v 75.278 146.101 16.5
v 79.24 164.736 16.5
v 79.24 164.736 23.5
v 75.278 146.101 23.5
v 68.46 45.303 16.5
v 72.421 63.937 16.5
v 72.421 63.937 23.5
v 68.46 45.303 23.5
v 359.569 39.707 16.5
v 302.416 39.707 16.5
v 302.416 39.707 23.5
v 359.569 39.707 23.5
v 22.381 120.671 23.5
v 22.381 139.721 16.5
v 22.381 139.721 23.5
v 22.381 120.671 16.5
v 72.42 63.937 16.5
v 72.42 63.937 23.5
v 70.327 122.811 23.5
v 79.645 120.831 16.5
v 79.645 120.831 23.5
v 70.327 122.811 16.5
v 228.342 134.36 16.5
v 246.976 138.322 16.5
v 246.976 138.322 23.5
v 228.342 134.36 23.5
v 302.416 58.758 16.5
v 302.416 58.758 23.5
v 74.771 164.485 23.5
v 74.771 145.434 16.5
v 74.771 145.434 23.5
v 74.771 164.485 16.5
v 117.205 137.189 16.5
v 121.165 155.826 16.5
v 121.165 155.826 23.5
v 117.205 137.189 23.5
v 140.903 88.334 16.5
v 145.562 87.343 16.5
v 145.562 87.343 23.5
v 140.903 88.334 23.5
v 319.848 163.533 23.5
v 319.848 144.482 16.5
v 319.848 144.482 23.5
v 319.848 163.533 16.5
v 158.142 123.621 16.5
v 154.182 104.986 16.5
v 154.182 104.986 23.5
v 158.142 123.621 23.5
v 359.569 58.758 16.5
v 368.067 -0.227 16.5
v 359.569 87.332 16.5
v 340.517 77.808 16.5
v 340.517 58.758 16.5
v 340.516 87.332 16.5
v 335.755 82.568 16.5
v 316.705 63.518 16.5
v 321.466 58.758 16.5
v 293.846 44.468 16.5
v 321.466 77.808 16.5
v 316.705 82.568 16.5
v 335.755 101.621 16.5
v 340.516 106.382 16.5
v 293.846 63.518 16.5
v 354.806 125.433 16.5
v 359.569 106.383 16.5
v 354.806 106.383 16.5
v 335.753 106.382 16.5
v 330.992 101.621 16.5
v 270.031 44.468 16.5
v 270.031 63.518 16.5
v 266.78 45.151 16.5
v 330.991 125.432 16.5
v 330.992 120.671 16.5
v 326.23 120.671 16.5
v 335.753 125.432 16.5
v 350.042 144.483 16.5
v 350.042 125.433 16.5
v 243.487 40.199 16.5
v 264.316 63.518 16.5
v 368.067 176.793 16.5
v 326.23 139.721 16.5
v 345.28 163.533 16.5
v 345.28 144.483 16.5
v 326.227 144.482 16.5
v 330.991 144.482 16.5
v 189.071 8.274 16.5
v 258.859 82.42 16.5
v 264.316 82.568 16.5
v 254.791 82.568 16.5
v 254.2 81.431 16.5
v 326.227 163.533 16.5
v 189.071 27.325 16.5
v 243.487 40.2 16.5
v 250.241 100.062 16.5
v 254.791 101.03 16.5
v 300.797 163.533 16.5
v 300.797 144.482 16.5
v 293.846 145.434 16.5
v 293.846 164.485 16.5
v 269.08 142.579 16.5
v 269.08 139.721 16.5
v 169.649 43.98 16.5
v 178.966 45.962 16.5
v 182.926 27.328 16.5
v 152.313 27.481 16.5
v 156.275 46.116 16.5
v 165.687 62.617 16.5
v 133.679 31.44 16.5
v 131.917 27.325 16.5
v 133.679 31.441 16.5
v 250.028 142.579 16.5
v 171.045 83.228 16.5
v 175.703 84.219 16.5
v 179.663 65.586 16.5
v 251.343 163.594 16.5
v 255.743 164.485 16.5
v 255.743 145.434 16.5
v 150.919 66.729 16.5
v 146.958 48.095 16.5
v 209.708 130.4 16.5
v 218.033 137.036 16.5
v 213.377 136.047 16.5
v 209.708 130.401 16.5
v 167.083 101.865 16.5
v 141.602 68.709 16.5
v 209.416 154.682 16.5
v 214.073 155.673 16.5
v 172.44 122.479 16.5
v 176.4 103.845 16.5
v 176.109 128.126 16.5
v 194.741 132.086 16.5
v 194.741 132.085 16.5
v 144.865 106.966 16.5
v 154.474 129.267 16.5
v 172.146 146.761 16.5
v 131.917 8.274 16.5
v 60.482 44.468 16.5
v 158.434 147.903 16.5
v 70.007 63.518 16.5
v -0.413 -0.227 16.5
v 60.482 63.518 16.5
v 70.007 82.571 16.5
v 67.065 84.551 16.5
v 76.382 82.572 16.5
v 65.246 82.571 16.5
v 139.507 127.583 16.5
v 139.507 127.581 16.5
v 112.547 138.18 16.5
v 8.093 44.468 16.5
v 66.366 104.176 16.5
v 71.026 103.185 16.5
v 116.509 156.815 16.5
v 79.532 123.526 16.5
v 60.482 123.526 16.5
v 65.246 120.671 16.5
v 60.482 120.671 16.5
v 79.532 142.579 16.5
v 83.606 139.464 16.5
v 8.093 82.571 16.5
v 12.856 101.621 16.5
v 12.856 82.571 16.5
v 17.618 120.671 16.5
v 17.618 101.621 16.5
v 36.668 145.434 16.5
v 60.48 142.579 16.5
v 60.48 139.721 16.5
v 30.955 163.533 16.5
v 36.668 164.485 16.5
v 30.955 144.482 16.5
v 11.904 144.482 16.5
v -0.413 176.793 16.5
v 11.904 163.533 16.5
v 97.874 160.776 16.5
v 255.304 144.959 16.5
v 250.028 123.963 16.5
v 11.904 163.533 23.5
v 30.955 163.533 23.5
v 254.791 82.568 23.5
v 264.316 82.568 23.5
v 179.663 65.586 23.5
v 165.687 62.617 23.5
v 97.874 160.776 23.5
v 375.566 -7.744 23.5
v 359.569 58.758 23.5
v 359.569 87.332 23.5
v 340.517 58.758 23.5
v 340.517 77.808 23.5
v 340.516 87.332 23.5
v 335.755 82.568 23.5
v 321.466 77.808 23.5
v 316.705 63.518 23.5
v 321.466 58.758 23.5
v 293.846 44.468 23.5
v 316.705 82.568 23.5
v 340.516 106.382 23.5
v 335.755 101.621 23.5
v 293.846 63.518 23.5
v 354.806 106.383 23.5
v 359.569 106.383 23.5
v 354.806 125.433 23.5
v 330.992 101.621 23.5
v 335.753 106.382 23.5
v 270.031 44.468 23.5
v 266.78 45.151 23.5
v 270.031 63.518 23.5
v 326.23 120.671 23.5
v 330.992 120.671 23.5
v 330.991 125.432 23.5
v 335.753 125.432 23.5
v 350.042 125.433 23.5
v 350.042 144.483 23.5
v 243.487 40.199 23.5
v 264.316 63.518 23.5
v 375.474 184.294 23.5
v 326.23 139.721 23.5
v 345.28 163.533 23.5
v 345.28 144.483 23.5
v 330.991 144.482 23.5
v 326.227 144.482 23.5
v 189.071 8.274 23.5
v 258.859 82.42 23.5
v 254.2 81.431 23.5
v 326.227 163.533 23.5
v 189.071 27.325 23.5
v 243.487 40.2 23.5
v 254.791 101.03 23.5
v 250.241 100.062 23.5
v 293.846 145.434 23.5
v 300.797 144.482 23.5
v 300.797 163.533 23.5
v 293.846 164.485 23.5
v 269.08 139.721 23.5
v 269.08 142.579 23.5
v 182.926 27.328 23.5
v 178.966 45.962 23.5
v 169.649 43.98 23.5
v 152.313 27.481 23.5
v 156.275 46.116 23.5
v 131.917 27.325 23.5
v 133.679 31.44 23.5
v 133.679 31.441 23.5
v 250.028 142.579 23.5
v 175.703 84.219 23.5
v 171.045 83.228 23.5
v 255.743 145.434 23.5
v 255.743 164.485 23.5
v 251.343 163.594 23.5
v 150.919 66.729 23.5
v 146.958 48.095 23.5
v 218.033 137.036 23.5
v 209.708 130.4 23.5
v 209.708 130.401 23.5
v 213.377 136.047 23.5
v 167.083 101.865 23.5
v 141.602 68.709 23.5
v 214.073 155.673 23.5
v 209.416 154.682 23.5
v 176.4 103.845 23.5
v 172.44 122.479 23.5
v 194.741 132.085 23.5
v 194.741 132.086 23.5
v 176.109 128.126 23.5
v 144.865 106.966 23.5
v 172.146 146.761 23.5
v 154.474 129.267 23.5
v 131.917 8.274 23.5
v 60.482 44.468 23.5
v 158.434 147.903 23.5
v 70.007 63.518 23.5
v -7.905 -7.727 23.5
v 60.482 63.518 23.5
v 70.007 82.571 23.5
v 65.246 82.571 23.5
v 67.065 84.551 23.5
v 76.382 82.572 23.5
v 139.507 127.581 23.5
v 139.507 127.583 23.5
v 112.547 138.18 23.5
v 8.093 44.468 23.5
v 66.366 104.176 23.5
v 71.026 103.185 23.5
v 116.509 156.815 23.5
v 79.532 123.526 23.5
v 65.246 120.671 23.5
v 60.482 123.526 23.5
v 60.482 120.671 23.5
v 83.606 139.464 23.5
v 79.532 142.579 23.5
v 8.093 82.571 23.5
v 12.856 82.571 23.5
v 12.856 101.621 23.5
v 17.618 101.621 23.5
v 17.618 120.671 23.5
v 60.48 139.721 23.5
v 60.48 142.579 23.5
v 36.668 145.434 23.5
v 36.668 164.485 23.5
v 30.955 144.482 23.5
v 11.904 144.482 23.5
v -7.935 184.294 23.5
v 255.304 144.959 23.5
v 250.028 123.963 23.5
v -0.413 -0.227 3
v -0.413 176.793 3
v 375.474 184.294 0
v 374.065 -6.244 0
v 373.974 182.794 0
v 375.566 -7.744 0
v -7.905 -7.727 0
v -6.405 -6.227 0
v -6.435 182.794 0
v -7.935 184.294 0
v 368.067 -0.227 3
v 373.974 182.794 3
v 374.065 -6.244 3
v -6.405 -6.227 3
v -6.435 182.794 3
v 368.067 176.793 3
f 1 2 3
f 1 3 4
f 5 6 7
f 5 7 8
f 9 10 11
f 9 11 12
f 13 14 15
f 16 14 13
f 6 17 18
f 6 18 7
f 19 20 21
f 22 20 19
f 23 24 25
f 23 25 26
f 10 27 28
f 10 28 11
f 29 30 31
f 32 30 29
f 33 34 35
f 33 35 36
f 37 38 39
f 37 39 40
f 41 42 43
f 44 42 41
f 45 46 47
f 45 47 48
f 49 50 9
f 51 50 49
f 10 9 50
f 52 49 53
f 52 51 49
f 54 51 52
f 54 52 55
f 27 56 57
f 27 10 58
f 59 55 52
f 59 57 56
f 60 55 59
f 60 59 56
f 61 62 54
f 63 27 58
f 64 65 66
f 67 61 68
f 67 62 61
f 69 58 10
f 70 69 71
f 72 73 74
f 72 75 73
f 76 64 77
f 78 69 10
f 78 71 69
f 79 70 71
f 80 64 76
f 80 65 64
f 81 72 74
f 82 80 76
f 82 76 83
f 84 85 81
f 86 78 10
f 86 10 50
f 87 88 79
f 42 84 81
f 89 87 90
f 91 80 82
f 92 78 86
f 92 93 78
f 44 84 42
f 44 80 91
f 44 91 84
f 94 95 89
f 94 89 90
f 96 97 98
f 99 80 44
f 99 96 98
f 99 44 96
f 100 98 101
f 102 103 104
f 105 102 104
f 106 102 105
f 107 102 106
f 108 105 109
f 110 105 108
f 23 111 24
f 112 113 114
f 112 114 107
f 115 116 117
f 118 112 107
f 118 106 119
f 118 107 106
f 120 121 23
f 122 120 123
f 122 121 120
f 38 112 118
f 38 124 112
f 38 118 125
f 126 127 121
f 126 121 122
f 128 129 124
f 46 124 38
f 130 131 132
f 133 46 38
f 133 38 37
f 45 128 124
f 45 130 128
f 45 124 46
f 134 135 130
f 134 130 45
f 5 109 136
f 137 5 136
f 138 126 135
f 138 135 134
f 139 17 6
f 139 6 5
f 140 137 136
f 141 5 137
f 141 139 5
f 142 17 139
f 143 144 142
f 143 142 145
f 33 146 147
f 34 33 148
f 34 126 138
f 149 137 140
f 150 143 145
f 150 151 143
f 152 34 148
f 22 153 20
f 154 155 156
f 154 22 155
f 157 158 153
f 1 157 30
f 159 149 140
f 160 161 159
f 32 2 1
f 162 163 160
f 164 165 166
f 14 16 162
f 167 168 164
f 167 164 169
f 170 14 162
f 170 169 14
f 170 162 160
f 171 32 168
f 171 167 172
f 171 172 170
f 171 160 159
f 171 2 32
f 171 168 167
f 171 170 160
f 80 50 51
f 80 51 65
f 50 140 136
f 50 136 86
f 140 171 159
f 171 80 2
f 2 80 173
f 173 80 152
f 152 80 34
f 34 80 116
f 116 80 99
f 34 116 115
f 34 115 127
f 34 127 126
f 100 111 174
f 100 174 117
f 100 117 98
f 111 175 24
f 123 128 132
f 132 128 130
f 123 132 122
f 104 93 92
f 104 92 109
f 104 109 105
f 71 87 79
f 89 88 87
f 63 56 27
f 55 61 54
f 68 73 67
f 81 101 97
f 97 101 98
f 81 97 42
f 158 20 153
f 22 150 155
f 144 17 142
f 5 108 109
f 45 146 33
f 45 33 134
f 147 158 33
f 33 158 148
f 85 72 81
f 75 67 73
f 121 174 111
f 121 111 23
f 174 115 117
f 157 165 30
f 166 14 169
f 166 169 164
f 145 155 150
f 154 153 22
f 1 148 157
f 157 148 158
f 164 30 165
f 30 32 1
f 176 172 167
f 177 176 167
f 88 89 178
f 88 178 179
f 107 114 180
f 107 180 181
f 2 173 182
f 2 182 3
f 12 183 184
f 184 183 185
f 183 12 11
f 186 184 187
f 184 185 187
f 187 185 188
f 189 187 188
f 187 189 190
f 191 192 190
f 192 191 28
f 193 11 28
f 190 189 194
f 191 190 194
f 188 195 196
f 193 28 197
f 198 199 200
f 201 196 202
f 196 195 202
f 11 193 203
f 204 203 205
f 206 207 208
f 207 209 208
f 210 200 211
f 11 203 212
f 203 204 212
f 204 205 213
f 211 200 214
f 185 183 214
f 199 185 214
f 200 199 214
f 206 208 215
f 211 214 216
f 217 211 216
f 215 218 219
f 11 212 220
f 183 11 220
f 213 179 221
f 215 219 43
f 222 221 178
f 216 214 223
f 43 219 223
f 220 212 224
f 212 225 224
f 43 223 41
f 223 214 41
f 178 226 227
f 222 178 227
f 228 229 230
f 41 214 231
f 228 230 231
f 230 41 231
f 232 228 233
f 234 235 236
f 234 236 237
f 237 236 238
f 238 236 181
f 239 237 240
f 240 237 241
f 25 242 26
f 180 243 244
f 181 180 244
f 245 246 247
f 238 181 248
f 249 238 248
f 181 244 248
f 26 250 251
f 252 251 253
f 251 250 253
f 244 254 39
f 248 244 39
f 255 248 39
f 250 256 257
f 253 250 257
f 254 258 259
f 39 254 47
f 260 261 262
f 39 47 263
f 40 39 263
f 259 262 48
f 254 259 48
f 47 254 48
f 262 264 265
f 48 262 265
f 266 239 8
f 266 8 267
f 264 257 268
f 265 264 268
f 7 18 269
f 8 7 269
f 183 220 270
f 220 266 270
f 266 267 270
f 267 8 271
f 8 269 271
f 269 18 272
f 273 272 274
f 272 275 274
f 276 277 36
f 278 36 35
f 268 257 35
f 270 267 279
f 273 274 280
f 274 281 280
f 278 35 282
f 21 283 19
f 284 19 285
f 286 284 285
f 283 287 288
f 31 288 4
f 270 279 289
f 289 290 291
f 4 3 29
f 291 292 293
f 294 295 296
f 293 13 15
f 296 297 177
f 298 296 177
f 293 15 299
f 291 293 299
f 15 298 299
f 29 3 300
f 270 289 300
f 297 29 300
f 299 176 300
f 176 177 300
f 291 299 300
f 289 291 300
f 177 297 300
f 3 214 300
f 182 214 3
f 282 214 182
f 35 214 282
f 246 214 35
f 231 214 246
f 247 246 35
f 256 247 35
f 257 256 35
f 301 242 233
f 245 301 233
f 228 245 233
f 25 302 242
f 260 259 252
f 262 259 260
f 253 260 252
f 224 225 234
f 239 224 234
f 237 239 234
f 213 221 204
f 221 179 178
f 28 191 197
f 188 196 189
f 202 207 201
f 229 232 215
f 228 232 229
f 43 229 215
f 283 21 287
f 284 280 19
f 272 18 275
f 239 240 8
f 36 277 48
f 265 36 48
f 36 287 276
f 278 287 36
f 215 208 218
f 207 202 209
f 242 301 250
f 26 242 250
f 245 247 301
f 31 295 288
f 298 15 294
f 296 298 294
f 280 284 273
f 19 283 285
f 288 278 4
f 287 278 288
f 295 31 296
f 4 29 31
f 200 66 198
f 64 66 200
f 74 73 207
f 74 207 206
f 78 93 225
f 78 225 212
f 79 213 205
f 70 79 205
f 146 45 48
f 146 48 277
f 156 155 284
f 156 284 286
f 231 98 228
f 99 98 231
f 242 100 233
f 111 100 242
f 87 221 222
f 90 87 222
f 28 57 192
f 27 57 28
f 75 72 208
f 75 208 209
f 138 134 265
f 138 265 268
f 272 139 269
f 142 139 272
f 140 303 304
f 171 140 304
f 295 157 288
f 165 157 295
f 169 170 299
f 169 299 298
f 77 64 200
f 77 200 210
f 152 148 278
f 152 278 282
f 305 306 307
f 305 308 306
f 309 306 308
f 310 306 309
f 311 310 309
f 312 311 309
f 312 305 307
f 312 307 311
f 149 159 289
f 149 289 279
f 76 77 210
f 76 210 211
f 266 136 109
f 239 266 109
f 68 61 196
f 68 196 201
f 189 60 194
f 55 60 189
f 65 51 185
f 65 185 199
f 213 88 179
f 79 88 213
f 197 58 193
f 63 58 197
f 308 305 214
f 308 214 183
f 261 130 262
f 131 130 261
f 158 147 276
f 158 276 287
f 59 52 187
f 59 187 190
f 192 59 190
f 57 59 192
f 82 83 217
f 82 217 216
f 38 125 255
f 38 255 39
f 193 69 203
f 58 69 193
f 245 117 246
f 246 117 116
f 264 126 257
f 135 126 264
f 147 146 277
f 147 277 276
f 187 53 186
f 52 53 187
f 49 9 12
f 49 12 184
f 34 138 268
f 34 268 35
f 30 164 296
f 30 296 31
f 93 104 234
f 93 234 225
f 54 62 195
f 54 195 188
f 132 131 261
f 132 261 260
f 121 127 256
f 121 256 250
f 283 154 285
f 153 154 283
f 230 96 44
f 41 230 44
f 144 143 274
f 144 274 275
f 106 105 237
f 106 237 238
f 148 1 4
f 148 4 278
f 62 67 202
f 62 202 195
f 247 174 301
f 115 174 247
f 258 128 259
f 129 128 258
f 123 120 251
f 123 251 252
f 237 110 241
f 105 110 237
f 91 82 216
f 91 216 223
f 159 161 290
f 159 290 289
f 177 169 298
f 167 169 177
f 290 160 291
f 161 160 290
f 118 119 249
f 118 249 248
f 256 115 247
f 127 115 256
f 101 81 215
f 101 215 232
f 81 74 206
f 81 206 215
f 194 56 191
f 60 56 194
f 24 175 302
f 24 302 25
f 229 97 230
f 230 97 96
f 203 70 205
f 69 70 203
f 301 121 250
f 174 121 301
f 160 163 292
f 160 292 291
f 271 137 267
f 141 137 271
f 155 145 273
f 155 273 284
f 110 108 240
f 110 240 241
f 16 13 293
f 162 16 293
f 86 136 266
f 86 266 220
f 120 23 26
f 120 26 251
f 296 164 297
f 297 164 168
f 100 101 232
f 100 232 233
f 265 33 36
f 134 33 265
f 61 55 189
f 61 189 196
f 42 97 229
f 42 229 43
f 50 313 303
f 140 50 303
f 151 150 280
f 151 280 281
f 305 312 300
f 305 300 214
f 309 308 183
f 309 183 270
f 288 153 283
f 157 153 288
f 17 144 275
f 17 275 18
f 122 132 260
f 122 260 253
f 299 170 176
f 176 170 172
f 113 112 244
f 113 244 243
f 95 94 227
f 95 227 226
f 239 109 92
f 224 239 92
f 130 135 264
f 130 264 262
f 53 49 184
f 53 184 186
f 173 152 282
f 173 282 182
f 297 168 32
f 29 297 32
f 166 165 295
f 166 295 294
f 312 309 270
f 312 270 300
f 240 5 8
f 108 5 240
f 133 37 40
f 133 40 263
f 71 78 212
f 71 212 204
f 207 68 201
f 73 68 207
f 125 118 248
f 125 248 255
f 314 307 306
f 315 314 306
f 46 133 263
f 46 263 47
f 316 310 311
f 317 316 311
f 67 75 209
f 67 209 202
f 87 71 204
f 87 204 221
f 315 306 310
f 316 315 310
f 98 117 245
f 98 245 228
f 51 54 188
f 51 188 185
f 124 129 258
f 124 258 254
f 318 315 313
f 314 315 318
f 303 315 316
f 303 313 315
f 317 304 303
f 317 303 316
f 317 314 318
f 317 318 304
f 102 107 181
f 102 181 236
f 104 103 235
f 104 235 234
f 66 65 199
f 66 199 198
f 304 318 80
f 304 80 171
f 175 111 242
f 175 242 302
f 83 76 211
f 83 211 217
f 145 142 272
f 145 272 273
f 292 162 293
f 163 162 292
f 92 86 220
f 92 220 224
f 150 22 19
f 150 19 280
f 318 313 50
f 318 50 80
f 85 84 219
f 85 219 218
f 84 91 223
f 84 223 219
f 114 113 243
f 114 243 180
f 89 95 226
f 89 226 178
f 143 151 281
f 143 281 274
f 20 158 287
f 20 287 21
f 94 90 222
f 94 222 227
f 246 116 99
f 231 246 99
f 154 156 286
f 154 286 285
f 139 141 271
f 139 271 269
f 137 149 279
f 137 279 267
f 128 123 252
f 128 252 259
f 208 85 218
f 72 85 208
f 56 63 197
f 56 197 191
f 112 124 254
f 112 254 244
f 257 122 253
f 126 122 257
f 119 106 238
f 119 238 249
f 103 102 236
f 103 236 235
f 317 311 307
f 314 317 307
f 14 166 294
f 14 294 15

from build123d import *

# Parameters (mm, degrees)
MODEL_W             = 57.154
MODEL_H             = 19.05137
MODEL_W_2           = 19.051
MODEL_H_2           = 19.051
MODEL_W_3           = 19.0514
MODEL_W_4           = 38.103
MODEL_W_5           = 38.1028
EXTRUDE_1_DEPTH     = 23.5
SKETCH_2_W          = 368.48
SKETCH_2_H          = 177.02
CUT_EXTRUDE_1_DEPTH = 16.5
CUT_EXTRUDE_2_DEPTH = 3


with BuildPart() as part:
    # Model → 凸台-拉伸1 (new body)
    with BuildSketch(Plane.XY):
        Polygon((-7.904930268, -7.726795577), (-7.935386074, 184.294), (375.473711158, 184.294), (375.566, -7.74368854), align=None)
        with Locations((160.494, 17.799415)):
            Rectangle(MODEL_W, MODEL_H, mode=Mode.SUBTRACT)
        Polygon((250.028, 142.579), (250.028, 123.963), (246.976, 138.322), (228.342, 134.36), (209.708, 130.4), (209.708, 130.401), (172.44, 122.479), (176.4, 103.845), (167.083, 101.865), (171.045, 83.228), (175.703, 84.2186), (179.663, 65.5863), (165.687, 62.6166), (169.649, 43.9801), (178.966, 45.9617), (182.926, 27.3279), (243.487, 40.2001), (243.487, 40.1987), (266.78, 45.1513), (258.859, 82.4205), (254.2, 81.431), (250.241, 100.062), (254.791, 101.03), (254.791, 82.568), (264.316, 82.568), (264.316, 63.518), (270.031, 63.518), (270.031, 44.468), (293.846, 44.468), (293.846, 63.518), (316.705, 63.518), (316.705, 82.568), (335.755, 82.568), (335.755, 101.621), (330.992, 101.621), (330.992, 120.671), (326.23, 120.671), (326.23, 139.721), (269.08, 139.721), (269.08, 142.579), align=None, mode=Mode.SUBTRACT)
        Polygon((79.6452, 120.831), (70.327, 122.811), (66.3663, 104.176), (71.0255, 103.185), (67.0648, 84.551), (76.382, 82.5722), (72.42, 63.9367), (72.4214, 63.9367), (68.4597, 45.303), (133.679, 31.4399), (133.679, 31.4413), (152.313, 27.4808), (156.275, 46.1162), (146.958, 48.0949), (150.919, 66.7286), (141.602, 68.7091), (145.562, 87.3428), (140.903, 88.3338), (144.865, 106.966), (154.182, 104.986), (158.142, 123.621), (139.507, 127.583), (139.507, 127.581), (83.6055, 139.464), align=None, mode=Mode.SUBTRACT)
        Polygon((321.466, 77.8083), (321.466, 58.7583), (302.416, 58.7583), (302.416, 39.7069), (359.569, 39.7069), (359.569, 58.7583), (340.517, 58.7583), (340.517, 77.8083), align=None, mode=Mode.SUBTRACT)
        Polygon((60.4795, 142.579), (60.4795, 139.721), (22.3807, 139.721), (22.3807, 120.671), (17.6182, 120.671), (17.6182, 101.621), (12.8557, 101.621), (12.8557, 82.5708), (8.09322, 82.5708), (8.09322, 44.468), (60.482, 44.468), (60.482, 63.518), (70.007, 63.518), (70.007, 82.5708), (65.2459, 82.5708), (65.2459, 120.671), (60.482, 120.671), (60.482, 123.526), (79.532, 123.526), (79.532, 142.579), align=None, mode=Mode.SUBTRACT)
        Polygon((326.227, 163.533), (326.227, 144.482), (330.991, 144.482), (330.991, 125.432), (335.753, 125.432), (335.753, 106.382), (340.516, 106.382), (340.516, 87.3319), (359.569, 87.3319), (359.569, 106.383), (354.806, 106.383), (354.806, 125.433), (350.042, 125.433), (350.042, 144.483), (345.28, 144.483), (345.28, 163.533), align=None, mode=Mode.SUBTRACT)
        Polygon((172.146, 146.761), (176.109, 128.126), (194.741, 132.086), (194.741, 132.085), (213.377, 136.047), (209.416, 154.682), align=None, mode=Mode.SUBTRACT)
        Polygon((117.205, 137.189), (154.474, 129.267), (158.434, 147.903), (121.165, 155.826), align=None, mode=Mode.SUBTRACT)
        Polygon((214.073, 155.673), (218.033, 137.036), (255.304, 144.959), (251.343, 163.594), align=None, mode=Mode.SUBTRACT)
        Polygon((75.2782, 146.101), (112.547, 138.18), (116.509, 156.815), (97.874, 160.776), (79.2399, 164.736), align=None, mode=Mode.SUBTRACT)
        with Locations((310.3225, 154.0075)):
            Rectangle(MODEL_W_2, MODEL_H_2, mode=Mode.SUBTRACT)
        with Locations((21.4292, 154.0075)):
            Rectangle(MODEL_W_3, MODEL_H_2, mode=Mode.SUBTRACT)
        with Locations((274.7945, 154.9595)):
            Rectangle(MODEL_W_4, MODEL_H_2, mode=Mode.SUBTRACT)
        with Locations((55.7195, 154.9595)):
            Rectangle(MODEL_W_5, MODEL_H_2, mode=Mode.SUBTRACT)
    extrude(amount=EXTRUDE_1_DEPTH)

    # 草图2 → 切除-拉伸1 (cut)
    with BuildSketch(Plane(origin=(0, 0, 0), x_dir=(-1, 0, 0), z_dir=(0, 0, -1))):
        with Locations((-183.826556737, 88.283426)):
            Rectangle(SKETCH_2_W, SKETCH_2_H)
    extrude(amount=-CUT_EXTRUDE_1_DEPTH, mode=Mode.SUBTRACT)

    # 草图3 → 切除-拉伸2 (cut)
    with BuildSketch(Plane(origin=(0, 0, 0), x_dir=(-1, 0, 0), z_dir=(0, 0, -1))):
        Polygon((-374.06527893, -6.243622428), (6.405168149, -6.226861644), (6.435148145, 182.794), (-373.97443185, 182.794), align=None)
    extrude(amount=-CUT_EXTRUDE_2_DEPTH, mode=Mode.SUBTRACT)


solid = part.part
